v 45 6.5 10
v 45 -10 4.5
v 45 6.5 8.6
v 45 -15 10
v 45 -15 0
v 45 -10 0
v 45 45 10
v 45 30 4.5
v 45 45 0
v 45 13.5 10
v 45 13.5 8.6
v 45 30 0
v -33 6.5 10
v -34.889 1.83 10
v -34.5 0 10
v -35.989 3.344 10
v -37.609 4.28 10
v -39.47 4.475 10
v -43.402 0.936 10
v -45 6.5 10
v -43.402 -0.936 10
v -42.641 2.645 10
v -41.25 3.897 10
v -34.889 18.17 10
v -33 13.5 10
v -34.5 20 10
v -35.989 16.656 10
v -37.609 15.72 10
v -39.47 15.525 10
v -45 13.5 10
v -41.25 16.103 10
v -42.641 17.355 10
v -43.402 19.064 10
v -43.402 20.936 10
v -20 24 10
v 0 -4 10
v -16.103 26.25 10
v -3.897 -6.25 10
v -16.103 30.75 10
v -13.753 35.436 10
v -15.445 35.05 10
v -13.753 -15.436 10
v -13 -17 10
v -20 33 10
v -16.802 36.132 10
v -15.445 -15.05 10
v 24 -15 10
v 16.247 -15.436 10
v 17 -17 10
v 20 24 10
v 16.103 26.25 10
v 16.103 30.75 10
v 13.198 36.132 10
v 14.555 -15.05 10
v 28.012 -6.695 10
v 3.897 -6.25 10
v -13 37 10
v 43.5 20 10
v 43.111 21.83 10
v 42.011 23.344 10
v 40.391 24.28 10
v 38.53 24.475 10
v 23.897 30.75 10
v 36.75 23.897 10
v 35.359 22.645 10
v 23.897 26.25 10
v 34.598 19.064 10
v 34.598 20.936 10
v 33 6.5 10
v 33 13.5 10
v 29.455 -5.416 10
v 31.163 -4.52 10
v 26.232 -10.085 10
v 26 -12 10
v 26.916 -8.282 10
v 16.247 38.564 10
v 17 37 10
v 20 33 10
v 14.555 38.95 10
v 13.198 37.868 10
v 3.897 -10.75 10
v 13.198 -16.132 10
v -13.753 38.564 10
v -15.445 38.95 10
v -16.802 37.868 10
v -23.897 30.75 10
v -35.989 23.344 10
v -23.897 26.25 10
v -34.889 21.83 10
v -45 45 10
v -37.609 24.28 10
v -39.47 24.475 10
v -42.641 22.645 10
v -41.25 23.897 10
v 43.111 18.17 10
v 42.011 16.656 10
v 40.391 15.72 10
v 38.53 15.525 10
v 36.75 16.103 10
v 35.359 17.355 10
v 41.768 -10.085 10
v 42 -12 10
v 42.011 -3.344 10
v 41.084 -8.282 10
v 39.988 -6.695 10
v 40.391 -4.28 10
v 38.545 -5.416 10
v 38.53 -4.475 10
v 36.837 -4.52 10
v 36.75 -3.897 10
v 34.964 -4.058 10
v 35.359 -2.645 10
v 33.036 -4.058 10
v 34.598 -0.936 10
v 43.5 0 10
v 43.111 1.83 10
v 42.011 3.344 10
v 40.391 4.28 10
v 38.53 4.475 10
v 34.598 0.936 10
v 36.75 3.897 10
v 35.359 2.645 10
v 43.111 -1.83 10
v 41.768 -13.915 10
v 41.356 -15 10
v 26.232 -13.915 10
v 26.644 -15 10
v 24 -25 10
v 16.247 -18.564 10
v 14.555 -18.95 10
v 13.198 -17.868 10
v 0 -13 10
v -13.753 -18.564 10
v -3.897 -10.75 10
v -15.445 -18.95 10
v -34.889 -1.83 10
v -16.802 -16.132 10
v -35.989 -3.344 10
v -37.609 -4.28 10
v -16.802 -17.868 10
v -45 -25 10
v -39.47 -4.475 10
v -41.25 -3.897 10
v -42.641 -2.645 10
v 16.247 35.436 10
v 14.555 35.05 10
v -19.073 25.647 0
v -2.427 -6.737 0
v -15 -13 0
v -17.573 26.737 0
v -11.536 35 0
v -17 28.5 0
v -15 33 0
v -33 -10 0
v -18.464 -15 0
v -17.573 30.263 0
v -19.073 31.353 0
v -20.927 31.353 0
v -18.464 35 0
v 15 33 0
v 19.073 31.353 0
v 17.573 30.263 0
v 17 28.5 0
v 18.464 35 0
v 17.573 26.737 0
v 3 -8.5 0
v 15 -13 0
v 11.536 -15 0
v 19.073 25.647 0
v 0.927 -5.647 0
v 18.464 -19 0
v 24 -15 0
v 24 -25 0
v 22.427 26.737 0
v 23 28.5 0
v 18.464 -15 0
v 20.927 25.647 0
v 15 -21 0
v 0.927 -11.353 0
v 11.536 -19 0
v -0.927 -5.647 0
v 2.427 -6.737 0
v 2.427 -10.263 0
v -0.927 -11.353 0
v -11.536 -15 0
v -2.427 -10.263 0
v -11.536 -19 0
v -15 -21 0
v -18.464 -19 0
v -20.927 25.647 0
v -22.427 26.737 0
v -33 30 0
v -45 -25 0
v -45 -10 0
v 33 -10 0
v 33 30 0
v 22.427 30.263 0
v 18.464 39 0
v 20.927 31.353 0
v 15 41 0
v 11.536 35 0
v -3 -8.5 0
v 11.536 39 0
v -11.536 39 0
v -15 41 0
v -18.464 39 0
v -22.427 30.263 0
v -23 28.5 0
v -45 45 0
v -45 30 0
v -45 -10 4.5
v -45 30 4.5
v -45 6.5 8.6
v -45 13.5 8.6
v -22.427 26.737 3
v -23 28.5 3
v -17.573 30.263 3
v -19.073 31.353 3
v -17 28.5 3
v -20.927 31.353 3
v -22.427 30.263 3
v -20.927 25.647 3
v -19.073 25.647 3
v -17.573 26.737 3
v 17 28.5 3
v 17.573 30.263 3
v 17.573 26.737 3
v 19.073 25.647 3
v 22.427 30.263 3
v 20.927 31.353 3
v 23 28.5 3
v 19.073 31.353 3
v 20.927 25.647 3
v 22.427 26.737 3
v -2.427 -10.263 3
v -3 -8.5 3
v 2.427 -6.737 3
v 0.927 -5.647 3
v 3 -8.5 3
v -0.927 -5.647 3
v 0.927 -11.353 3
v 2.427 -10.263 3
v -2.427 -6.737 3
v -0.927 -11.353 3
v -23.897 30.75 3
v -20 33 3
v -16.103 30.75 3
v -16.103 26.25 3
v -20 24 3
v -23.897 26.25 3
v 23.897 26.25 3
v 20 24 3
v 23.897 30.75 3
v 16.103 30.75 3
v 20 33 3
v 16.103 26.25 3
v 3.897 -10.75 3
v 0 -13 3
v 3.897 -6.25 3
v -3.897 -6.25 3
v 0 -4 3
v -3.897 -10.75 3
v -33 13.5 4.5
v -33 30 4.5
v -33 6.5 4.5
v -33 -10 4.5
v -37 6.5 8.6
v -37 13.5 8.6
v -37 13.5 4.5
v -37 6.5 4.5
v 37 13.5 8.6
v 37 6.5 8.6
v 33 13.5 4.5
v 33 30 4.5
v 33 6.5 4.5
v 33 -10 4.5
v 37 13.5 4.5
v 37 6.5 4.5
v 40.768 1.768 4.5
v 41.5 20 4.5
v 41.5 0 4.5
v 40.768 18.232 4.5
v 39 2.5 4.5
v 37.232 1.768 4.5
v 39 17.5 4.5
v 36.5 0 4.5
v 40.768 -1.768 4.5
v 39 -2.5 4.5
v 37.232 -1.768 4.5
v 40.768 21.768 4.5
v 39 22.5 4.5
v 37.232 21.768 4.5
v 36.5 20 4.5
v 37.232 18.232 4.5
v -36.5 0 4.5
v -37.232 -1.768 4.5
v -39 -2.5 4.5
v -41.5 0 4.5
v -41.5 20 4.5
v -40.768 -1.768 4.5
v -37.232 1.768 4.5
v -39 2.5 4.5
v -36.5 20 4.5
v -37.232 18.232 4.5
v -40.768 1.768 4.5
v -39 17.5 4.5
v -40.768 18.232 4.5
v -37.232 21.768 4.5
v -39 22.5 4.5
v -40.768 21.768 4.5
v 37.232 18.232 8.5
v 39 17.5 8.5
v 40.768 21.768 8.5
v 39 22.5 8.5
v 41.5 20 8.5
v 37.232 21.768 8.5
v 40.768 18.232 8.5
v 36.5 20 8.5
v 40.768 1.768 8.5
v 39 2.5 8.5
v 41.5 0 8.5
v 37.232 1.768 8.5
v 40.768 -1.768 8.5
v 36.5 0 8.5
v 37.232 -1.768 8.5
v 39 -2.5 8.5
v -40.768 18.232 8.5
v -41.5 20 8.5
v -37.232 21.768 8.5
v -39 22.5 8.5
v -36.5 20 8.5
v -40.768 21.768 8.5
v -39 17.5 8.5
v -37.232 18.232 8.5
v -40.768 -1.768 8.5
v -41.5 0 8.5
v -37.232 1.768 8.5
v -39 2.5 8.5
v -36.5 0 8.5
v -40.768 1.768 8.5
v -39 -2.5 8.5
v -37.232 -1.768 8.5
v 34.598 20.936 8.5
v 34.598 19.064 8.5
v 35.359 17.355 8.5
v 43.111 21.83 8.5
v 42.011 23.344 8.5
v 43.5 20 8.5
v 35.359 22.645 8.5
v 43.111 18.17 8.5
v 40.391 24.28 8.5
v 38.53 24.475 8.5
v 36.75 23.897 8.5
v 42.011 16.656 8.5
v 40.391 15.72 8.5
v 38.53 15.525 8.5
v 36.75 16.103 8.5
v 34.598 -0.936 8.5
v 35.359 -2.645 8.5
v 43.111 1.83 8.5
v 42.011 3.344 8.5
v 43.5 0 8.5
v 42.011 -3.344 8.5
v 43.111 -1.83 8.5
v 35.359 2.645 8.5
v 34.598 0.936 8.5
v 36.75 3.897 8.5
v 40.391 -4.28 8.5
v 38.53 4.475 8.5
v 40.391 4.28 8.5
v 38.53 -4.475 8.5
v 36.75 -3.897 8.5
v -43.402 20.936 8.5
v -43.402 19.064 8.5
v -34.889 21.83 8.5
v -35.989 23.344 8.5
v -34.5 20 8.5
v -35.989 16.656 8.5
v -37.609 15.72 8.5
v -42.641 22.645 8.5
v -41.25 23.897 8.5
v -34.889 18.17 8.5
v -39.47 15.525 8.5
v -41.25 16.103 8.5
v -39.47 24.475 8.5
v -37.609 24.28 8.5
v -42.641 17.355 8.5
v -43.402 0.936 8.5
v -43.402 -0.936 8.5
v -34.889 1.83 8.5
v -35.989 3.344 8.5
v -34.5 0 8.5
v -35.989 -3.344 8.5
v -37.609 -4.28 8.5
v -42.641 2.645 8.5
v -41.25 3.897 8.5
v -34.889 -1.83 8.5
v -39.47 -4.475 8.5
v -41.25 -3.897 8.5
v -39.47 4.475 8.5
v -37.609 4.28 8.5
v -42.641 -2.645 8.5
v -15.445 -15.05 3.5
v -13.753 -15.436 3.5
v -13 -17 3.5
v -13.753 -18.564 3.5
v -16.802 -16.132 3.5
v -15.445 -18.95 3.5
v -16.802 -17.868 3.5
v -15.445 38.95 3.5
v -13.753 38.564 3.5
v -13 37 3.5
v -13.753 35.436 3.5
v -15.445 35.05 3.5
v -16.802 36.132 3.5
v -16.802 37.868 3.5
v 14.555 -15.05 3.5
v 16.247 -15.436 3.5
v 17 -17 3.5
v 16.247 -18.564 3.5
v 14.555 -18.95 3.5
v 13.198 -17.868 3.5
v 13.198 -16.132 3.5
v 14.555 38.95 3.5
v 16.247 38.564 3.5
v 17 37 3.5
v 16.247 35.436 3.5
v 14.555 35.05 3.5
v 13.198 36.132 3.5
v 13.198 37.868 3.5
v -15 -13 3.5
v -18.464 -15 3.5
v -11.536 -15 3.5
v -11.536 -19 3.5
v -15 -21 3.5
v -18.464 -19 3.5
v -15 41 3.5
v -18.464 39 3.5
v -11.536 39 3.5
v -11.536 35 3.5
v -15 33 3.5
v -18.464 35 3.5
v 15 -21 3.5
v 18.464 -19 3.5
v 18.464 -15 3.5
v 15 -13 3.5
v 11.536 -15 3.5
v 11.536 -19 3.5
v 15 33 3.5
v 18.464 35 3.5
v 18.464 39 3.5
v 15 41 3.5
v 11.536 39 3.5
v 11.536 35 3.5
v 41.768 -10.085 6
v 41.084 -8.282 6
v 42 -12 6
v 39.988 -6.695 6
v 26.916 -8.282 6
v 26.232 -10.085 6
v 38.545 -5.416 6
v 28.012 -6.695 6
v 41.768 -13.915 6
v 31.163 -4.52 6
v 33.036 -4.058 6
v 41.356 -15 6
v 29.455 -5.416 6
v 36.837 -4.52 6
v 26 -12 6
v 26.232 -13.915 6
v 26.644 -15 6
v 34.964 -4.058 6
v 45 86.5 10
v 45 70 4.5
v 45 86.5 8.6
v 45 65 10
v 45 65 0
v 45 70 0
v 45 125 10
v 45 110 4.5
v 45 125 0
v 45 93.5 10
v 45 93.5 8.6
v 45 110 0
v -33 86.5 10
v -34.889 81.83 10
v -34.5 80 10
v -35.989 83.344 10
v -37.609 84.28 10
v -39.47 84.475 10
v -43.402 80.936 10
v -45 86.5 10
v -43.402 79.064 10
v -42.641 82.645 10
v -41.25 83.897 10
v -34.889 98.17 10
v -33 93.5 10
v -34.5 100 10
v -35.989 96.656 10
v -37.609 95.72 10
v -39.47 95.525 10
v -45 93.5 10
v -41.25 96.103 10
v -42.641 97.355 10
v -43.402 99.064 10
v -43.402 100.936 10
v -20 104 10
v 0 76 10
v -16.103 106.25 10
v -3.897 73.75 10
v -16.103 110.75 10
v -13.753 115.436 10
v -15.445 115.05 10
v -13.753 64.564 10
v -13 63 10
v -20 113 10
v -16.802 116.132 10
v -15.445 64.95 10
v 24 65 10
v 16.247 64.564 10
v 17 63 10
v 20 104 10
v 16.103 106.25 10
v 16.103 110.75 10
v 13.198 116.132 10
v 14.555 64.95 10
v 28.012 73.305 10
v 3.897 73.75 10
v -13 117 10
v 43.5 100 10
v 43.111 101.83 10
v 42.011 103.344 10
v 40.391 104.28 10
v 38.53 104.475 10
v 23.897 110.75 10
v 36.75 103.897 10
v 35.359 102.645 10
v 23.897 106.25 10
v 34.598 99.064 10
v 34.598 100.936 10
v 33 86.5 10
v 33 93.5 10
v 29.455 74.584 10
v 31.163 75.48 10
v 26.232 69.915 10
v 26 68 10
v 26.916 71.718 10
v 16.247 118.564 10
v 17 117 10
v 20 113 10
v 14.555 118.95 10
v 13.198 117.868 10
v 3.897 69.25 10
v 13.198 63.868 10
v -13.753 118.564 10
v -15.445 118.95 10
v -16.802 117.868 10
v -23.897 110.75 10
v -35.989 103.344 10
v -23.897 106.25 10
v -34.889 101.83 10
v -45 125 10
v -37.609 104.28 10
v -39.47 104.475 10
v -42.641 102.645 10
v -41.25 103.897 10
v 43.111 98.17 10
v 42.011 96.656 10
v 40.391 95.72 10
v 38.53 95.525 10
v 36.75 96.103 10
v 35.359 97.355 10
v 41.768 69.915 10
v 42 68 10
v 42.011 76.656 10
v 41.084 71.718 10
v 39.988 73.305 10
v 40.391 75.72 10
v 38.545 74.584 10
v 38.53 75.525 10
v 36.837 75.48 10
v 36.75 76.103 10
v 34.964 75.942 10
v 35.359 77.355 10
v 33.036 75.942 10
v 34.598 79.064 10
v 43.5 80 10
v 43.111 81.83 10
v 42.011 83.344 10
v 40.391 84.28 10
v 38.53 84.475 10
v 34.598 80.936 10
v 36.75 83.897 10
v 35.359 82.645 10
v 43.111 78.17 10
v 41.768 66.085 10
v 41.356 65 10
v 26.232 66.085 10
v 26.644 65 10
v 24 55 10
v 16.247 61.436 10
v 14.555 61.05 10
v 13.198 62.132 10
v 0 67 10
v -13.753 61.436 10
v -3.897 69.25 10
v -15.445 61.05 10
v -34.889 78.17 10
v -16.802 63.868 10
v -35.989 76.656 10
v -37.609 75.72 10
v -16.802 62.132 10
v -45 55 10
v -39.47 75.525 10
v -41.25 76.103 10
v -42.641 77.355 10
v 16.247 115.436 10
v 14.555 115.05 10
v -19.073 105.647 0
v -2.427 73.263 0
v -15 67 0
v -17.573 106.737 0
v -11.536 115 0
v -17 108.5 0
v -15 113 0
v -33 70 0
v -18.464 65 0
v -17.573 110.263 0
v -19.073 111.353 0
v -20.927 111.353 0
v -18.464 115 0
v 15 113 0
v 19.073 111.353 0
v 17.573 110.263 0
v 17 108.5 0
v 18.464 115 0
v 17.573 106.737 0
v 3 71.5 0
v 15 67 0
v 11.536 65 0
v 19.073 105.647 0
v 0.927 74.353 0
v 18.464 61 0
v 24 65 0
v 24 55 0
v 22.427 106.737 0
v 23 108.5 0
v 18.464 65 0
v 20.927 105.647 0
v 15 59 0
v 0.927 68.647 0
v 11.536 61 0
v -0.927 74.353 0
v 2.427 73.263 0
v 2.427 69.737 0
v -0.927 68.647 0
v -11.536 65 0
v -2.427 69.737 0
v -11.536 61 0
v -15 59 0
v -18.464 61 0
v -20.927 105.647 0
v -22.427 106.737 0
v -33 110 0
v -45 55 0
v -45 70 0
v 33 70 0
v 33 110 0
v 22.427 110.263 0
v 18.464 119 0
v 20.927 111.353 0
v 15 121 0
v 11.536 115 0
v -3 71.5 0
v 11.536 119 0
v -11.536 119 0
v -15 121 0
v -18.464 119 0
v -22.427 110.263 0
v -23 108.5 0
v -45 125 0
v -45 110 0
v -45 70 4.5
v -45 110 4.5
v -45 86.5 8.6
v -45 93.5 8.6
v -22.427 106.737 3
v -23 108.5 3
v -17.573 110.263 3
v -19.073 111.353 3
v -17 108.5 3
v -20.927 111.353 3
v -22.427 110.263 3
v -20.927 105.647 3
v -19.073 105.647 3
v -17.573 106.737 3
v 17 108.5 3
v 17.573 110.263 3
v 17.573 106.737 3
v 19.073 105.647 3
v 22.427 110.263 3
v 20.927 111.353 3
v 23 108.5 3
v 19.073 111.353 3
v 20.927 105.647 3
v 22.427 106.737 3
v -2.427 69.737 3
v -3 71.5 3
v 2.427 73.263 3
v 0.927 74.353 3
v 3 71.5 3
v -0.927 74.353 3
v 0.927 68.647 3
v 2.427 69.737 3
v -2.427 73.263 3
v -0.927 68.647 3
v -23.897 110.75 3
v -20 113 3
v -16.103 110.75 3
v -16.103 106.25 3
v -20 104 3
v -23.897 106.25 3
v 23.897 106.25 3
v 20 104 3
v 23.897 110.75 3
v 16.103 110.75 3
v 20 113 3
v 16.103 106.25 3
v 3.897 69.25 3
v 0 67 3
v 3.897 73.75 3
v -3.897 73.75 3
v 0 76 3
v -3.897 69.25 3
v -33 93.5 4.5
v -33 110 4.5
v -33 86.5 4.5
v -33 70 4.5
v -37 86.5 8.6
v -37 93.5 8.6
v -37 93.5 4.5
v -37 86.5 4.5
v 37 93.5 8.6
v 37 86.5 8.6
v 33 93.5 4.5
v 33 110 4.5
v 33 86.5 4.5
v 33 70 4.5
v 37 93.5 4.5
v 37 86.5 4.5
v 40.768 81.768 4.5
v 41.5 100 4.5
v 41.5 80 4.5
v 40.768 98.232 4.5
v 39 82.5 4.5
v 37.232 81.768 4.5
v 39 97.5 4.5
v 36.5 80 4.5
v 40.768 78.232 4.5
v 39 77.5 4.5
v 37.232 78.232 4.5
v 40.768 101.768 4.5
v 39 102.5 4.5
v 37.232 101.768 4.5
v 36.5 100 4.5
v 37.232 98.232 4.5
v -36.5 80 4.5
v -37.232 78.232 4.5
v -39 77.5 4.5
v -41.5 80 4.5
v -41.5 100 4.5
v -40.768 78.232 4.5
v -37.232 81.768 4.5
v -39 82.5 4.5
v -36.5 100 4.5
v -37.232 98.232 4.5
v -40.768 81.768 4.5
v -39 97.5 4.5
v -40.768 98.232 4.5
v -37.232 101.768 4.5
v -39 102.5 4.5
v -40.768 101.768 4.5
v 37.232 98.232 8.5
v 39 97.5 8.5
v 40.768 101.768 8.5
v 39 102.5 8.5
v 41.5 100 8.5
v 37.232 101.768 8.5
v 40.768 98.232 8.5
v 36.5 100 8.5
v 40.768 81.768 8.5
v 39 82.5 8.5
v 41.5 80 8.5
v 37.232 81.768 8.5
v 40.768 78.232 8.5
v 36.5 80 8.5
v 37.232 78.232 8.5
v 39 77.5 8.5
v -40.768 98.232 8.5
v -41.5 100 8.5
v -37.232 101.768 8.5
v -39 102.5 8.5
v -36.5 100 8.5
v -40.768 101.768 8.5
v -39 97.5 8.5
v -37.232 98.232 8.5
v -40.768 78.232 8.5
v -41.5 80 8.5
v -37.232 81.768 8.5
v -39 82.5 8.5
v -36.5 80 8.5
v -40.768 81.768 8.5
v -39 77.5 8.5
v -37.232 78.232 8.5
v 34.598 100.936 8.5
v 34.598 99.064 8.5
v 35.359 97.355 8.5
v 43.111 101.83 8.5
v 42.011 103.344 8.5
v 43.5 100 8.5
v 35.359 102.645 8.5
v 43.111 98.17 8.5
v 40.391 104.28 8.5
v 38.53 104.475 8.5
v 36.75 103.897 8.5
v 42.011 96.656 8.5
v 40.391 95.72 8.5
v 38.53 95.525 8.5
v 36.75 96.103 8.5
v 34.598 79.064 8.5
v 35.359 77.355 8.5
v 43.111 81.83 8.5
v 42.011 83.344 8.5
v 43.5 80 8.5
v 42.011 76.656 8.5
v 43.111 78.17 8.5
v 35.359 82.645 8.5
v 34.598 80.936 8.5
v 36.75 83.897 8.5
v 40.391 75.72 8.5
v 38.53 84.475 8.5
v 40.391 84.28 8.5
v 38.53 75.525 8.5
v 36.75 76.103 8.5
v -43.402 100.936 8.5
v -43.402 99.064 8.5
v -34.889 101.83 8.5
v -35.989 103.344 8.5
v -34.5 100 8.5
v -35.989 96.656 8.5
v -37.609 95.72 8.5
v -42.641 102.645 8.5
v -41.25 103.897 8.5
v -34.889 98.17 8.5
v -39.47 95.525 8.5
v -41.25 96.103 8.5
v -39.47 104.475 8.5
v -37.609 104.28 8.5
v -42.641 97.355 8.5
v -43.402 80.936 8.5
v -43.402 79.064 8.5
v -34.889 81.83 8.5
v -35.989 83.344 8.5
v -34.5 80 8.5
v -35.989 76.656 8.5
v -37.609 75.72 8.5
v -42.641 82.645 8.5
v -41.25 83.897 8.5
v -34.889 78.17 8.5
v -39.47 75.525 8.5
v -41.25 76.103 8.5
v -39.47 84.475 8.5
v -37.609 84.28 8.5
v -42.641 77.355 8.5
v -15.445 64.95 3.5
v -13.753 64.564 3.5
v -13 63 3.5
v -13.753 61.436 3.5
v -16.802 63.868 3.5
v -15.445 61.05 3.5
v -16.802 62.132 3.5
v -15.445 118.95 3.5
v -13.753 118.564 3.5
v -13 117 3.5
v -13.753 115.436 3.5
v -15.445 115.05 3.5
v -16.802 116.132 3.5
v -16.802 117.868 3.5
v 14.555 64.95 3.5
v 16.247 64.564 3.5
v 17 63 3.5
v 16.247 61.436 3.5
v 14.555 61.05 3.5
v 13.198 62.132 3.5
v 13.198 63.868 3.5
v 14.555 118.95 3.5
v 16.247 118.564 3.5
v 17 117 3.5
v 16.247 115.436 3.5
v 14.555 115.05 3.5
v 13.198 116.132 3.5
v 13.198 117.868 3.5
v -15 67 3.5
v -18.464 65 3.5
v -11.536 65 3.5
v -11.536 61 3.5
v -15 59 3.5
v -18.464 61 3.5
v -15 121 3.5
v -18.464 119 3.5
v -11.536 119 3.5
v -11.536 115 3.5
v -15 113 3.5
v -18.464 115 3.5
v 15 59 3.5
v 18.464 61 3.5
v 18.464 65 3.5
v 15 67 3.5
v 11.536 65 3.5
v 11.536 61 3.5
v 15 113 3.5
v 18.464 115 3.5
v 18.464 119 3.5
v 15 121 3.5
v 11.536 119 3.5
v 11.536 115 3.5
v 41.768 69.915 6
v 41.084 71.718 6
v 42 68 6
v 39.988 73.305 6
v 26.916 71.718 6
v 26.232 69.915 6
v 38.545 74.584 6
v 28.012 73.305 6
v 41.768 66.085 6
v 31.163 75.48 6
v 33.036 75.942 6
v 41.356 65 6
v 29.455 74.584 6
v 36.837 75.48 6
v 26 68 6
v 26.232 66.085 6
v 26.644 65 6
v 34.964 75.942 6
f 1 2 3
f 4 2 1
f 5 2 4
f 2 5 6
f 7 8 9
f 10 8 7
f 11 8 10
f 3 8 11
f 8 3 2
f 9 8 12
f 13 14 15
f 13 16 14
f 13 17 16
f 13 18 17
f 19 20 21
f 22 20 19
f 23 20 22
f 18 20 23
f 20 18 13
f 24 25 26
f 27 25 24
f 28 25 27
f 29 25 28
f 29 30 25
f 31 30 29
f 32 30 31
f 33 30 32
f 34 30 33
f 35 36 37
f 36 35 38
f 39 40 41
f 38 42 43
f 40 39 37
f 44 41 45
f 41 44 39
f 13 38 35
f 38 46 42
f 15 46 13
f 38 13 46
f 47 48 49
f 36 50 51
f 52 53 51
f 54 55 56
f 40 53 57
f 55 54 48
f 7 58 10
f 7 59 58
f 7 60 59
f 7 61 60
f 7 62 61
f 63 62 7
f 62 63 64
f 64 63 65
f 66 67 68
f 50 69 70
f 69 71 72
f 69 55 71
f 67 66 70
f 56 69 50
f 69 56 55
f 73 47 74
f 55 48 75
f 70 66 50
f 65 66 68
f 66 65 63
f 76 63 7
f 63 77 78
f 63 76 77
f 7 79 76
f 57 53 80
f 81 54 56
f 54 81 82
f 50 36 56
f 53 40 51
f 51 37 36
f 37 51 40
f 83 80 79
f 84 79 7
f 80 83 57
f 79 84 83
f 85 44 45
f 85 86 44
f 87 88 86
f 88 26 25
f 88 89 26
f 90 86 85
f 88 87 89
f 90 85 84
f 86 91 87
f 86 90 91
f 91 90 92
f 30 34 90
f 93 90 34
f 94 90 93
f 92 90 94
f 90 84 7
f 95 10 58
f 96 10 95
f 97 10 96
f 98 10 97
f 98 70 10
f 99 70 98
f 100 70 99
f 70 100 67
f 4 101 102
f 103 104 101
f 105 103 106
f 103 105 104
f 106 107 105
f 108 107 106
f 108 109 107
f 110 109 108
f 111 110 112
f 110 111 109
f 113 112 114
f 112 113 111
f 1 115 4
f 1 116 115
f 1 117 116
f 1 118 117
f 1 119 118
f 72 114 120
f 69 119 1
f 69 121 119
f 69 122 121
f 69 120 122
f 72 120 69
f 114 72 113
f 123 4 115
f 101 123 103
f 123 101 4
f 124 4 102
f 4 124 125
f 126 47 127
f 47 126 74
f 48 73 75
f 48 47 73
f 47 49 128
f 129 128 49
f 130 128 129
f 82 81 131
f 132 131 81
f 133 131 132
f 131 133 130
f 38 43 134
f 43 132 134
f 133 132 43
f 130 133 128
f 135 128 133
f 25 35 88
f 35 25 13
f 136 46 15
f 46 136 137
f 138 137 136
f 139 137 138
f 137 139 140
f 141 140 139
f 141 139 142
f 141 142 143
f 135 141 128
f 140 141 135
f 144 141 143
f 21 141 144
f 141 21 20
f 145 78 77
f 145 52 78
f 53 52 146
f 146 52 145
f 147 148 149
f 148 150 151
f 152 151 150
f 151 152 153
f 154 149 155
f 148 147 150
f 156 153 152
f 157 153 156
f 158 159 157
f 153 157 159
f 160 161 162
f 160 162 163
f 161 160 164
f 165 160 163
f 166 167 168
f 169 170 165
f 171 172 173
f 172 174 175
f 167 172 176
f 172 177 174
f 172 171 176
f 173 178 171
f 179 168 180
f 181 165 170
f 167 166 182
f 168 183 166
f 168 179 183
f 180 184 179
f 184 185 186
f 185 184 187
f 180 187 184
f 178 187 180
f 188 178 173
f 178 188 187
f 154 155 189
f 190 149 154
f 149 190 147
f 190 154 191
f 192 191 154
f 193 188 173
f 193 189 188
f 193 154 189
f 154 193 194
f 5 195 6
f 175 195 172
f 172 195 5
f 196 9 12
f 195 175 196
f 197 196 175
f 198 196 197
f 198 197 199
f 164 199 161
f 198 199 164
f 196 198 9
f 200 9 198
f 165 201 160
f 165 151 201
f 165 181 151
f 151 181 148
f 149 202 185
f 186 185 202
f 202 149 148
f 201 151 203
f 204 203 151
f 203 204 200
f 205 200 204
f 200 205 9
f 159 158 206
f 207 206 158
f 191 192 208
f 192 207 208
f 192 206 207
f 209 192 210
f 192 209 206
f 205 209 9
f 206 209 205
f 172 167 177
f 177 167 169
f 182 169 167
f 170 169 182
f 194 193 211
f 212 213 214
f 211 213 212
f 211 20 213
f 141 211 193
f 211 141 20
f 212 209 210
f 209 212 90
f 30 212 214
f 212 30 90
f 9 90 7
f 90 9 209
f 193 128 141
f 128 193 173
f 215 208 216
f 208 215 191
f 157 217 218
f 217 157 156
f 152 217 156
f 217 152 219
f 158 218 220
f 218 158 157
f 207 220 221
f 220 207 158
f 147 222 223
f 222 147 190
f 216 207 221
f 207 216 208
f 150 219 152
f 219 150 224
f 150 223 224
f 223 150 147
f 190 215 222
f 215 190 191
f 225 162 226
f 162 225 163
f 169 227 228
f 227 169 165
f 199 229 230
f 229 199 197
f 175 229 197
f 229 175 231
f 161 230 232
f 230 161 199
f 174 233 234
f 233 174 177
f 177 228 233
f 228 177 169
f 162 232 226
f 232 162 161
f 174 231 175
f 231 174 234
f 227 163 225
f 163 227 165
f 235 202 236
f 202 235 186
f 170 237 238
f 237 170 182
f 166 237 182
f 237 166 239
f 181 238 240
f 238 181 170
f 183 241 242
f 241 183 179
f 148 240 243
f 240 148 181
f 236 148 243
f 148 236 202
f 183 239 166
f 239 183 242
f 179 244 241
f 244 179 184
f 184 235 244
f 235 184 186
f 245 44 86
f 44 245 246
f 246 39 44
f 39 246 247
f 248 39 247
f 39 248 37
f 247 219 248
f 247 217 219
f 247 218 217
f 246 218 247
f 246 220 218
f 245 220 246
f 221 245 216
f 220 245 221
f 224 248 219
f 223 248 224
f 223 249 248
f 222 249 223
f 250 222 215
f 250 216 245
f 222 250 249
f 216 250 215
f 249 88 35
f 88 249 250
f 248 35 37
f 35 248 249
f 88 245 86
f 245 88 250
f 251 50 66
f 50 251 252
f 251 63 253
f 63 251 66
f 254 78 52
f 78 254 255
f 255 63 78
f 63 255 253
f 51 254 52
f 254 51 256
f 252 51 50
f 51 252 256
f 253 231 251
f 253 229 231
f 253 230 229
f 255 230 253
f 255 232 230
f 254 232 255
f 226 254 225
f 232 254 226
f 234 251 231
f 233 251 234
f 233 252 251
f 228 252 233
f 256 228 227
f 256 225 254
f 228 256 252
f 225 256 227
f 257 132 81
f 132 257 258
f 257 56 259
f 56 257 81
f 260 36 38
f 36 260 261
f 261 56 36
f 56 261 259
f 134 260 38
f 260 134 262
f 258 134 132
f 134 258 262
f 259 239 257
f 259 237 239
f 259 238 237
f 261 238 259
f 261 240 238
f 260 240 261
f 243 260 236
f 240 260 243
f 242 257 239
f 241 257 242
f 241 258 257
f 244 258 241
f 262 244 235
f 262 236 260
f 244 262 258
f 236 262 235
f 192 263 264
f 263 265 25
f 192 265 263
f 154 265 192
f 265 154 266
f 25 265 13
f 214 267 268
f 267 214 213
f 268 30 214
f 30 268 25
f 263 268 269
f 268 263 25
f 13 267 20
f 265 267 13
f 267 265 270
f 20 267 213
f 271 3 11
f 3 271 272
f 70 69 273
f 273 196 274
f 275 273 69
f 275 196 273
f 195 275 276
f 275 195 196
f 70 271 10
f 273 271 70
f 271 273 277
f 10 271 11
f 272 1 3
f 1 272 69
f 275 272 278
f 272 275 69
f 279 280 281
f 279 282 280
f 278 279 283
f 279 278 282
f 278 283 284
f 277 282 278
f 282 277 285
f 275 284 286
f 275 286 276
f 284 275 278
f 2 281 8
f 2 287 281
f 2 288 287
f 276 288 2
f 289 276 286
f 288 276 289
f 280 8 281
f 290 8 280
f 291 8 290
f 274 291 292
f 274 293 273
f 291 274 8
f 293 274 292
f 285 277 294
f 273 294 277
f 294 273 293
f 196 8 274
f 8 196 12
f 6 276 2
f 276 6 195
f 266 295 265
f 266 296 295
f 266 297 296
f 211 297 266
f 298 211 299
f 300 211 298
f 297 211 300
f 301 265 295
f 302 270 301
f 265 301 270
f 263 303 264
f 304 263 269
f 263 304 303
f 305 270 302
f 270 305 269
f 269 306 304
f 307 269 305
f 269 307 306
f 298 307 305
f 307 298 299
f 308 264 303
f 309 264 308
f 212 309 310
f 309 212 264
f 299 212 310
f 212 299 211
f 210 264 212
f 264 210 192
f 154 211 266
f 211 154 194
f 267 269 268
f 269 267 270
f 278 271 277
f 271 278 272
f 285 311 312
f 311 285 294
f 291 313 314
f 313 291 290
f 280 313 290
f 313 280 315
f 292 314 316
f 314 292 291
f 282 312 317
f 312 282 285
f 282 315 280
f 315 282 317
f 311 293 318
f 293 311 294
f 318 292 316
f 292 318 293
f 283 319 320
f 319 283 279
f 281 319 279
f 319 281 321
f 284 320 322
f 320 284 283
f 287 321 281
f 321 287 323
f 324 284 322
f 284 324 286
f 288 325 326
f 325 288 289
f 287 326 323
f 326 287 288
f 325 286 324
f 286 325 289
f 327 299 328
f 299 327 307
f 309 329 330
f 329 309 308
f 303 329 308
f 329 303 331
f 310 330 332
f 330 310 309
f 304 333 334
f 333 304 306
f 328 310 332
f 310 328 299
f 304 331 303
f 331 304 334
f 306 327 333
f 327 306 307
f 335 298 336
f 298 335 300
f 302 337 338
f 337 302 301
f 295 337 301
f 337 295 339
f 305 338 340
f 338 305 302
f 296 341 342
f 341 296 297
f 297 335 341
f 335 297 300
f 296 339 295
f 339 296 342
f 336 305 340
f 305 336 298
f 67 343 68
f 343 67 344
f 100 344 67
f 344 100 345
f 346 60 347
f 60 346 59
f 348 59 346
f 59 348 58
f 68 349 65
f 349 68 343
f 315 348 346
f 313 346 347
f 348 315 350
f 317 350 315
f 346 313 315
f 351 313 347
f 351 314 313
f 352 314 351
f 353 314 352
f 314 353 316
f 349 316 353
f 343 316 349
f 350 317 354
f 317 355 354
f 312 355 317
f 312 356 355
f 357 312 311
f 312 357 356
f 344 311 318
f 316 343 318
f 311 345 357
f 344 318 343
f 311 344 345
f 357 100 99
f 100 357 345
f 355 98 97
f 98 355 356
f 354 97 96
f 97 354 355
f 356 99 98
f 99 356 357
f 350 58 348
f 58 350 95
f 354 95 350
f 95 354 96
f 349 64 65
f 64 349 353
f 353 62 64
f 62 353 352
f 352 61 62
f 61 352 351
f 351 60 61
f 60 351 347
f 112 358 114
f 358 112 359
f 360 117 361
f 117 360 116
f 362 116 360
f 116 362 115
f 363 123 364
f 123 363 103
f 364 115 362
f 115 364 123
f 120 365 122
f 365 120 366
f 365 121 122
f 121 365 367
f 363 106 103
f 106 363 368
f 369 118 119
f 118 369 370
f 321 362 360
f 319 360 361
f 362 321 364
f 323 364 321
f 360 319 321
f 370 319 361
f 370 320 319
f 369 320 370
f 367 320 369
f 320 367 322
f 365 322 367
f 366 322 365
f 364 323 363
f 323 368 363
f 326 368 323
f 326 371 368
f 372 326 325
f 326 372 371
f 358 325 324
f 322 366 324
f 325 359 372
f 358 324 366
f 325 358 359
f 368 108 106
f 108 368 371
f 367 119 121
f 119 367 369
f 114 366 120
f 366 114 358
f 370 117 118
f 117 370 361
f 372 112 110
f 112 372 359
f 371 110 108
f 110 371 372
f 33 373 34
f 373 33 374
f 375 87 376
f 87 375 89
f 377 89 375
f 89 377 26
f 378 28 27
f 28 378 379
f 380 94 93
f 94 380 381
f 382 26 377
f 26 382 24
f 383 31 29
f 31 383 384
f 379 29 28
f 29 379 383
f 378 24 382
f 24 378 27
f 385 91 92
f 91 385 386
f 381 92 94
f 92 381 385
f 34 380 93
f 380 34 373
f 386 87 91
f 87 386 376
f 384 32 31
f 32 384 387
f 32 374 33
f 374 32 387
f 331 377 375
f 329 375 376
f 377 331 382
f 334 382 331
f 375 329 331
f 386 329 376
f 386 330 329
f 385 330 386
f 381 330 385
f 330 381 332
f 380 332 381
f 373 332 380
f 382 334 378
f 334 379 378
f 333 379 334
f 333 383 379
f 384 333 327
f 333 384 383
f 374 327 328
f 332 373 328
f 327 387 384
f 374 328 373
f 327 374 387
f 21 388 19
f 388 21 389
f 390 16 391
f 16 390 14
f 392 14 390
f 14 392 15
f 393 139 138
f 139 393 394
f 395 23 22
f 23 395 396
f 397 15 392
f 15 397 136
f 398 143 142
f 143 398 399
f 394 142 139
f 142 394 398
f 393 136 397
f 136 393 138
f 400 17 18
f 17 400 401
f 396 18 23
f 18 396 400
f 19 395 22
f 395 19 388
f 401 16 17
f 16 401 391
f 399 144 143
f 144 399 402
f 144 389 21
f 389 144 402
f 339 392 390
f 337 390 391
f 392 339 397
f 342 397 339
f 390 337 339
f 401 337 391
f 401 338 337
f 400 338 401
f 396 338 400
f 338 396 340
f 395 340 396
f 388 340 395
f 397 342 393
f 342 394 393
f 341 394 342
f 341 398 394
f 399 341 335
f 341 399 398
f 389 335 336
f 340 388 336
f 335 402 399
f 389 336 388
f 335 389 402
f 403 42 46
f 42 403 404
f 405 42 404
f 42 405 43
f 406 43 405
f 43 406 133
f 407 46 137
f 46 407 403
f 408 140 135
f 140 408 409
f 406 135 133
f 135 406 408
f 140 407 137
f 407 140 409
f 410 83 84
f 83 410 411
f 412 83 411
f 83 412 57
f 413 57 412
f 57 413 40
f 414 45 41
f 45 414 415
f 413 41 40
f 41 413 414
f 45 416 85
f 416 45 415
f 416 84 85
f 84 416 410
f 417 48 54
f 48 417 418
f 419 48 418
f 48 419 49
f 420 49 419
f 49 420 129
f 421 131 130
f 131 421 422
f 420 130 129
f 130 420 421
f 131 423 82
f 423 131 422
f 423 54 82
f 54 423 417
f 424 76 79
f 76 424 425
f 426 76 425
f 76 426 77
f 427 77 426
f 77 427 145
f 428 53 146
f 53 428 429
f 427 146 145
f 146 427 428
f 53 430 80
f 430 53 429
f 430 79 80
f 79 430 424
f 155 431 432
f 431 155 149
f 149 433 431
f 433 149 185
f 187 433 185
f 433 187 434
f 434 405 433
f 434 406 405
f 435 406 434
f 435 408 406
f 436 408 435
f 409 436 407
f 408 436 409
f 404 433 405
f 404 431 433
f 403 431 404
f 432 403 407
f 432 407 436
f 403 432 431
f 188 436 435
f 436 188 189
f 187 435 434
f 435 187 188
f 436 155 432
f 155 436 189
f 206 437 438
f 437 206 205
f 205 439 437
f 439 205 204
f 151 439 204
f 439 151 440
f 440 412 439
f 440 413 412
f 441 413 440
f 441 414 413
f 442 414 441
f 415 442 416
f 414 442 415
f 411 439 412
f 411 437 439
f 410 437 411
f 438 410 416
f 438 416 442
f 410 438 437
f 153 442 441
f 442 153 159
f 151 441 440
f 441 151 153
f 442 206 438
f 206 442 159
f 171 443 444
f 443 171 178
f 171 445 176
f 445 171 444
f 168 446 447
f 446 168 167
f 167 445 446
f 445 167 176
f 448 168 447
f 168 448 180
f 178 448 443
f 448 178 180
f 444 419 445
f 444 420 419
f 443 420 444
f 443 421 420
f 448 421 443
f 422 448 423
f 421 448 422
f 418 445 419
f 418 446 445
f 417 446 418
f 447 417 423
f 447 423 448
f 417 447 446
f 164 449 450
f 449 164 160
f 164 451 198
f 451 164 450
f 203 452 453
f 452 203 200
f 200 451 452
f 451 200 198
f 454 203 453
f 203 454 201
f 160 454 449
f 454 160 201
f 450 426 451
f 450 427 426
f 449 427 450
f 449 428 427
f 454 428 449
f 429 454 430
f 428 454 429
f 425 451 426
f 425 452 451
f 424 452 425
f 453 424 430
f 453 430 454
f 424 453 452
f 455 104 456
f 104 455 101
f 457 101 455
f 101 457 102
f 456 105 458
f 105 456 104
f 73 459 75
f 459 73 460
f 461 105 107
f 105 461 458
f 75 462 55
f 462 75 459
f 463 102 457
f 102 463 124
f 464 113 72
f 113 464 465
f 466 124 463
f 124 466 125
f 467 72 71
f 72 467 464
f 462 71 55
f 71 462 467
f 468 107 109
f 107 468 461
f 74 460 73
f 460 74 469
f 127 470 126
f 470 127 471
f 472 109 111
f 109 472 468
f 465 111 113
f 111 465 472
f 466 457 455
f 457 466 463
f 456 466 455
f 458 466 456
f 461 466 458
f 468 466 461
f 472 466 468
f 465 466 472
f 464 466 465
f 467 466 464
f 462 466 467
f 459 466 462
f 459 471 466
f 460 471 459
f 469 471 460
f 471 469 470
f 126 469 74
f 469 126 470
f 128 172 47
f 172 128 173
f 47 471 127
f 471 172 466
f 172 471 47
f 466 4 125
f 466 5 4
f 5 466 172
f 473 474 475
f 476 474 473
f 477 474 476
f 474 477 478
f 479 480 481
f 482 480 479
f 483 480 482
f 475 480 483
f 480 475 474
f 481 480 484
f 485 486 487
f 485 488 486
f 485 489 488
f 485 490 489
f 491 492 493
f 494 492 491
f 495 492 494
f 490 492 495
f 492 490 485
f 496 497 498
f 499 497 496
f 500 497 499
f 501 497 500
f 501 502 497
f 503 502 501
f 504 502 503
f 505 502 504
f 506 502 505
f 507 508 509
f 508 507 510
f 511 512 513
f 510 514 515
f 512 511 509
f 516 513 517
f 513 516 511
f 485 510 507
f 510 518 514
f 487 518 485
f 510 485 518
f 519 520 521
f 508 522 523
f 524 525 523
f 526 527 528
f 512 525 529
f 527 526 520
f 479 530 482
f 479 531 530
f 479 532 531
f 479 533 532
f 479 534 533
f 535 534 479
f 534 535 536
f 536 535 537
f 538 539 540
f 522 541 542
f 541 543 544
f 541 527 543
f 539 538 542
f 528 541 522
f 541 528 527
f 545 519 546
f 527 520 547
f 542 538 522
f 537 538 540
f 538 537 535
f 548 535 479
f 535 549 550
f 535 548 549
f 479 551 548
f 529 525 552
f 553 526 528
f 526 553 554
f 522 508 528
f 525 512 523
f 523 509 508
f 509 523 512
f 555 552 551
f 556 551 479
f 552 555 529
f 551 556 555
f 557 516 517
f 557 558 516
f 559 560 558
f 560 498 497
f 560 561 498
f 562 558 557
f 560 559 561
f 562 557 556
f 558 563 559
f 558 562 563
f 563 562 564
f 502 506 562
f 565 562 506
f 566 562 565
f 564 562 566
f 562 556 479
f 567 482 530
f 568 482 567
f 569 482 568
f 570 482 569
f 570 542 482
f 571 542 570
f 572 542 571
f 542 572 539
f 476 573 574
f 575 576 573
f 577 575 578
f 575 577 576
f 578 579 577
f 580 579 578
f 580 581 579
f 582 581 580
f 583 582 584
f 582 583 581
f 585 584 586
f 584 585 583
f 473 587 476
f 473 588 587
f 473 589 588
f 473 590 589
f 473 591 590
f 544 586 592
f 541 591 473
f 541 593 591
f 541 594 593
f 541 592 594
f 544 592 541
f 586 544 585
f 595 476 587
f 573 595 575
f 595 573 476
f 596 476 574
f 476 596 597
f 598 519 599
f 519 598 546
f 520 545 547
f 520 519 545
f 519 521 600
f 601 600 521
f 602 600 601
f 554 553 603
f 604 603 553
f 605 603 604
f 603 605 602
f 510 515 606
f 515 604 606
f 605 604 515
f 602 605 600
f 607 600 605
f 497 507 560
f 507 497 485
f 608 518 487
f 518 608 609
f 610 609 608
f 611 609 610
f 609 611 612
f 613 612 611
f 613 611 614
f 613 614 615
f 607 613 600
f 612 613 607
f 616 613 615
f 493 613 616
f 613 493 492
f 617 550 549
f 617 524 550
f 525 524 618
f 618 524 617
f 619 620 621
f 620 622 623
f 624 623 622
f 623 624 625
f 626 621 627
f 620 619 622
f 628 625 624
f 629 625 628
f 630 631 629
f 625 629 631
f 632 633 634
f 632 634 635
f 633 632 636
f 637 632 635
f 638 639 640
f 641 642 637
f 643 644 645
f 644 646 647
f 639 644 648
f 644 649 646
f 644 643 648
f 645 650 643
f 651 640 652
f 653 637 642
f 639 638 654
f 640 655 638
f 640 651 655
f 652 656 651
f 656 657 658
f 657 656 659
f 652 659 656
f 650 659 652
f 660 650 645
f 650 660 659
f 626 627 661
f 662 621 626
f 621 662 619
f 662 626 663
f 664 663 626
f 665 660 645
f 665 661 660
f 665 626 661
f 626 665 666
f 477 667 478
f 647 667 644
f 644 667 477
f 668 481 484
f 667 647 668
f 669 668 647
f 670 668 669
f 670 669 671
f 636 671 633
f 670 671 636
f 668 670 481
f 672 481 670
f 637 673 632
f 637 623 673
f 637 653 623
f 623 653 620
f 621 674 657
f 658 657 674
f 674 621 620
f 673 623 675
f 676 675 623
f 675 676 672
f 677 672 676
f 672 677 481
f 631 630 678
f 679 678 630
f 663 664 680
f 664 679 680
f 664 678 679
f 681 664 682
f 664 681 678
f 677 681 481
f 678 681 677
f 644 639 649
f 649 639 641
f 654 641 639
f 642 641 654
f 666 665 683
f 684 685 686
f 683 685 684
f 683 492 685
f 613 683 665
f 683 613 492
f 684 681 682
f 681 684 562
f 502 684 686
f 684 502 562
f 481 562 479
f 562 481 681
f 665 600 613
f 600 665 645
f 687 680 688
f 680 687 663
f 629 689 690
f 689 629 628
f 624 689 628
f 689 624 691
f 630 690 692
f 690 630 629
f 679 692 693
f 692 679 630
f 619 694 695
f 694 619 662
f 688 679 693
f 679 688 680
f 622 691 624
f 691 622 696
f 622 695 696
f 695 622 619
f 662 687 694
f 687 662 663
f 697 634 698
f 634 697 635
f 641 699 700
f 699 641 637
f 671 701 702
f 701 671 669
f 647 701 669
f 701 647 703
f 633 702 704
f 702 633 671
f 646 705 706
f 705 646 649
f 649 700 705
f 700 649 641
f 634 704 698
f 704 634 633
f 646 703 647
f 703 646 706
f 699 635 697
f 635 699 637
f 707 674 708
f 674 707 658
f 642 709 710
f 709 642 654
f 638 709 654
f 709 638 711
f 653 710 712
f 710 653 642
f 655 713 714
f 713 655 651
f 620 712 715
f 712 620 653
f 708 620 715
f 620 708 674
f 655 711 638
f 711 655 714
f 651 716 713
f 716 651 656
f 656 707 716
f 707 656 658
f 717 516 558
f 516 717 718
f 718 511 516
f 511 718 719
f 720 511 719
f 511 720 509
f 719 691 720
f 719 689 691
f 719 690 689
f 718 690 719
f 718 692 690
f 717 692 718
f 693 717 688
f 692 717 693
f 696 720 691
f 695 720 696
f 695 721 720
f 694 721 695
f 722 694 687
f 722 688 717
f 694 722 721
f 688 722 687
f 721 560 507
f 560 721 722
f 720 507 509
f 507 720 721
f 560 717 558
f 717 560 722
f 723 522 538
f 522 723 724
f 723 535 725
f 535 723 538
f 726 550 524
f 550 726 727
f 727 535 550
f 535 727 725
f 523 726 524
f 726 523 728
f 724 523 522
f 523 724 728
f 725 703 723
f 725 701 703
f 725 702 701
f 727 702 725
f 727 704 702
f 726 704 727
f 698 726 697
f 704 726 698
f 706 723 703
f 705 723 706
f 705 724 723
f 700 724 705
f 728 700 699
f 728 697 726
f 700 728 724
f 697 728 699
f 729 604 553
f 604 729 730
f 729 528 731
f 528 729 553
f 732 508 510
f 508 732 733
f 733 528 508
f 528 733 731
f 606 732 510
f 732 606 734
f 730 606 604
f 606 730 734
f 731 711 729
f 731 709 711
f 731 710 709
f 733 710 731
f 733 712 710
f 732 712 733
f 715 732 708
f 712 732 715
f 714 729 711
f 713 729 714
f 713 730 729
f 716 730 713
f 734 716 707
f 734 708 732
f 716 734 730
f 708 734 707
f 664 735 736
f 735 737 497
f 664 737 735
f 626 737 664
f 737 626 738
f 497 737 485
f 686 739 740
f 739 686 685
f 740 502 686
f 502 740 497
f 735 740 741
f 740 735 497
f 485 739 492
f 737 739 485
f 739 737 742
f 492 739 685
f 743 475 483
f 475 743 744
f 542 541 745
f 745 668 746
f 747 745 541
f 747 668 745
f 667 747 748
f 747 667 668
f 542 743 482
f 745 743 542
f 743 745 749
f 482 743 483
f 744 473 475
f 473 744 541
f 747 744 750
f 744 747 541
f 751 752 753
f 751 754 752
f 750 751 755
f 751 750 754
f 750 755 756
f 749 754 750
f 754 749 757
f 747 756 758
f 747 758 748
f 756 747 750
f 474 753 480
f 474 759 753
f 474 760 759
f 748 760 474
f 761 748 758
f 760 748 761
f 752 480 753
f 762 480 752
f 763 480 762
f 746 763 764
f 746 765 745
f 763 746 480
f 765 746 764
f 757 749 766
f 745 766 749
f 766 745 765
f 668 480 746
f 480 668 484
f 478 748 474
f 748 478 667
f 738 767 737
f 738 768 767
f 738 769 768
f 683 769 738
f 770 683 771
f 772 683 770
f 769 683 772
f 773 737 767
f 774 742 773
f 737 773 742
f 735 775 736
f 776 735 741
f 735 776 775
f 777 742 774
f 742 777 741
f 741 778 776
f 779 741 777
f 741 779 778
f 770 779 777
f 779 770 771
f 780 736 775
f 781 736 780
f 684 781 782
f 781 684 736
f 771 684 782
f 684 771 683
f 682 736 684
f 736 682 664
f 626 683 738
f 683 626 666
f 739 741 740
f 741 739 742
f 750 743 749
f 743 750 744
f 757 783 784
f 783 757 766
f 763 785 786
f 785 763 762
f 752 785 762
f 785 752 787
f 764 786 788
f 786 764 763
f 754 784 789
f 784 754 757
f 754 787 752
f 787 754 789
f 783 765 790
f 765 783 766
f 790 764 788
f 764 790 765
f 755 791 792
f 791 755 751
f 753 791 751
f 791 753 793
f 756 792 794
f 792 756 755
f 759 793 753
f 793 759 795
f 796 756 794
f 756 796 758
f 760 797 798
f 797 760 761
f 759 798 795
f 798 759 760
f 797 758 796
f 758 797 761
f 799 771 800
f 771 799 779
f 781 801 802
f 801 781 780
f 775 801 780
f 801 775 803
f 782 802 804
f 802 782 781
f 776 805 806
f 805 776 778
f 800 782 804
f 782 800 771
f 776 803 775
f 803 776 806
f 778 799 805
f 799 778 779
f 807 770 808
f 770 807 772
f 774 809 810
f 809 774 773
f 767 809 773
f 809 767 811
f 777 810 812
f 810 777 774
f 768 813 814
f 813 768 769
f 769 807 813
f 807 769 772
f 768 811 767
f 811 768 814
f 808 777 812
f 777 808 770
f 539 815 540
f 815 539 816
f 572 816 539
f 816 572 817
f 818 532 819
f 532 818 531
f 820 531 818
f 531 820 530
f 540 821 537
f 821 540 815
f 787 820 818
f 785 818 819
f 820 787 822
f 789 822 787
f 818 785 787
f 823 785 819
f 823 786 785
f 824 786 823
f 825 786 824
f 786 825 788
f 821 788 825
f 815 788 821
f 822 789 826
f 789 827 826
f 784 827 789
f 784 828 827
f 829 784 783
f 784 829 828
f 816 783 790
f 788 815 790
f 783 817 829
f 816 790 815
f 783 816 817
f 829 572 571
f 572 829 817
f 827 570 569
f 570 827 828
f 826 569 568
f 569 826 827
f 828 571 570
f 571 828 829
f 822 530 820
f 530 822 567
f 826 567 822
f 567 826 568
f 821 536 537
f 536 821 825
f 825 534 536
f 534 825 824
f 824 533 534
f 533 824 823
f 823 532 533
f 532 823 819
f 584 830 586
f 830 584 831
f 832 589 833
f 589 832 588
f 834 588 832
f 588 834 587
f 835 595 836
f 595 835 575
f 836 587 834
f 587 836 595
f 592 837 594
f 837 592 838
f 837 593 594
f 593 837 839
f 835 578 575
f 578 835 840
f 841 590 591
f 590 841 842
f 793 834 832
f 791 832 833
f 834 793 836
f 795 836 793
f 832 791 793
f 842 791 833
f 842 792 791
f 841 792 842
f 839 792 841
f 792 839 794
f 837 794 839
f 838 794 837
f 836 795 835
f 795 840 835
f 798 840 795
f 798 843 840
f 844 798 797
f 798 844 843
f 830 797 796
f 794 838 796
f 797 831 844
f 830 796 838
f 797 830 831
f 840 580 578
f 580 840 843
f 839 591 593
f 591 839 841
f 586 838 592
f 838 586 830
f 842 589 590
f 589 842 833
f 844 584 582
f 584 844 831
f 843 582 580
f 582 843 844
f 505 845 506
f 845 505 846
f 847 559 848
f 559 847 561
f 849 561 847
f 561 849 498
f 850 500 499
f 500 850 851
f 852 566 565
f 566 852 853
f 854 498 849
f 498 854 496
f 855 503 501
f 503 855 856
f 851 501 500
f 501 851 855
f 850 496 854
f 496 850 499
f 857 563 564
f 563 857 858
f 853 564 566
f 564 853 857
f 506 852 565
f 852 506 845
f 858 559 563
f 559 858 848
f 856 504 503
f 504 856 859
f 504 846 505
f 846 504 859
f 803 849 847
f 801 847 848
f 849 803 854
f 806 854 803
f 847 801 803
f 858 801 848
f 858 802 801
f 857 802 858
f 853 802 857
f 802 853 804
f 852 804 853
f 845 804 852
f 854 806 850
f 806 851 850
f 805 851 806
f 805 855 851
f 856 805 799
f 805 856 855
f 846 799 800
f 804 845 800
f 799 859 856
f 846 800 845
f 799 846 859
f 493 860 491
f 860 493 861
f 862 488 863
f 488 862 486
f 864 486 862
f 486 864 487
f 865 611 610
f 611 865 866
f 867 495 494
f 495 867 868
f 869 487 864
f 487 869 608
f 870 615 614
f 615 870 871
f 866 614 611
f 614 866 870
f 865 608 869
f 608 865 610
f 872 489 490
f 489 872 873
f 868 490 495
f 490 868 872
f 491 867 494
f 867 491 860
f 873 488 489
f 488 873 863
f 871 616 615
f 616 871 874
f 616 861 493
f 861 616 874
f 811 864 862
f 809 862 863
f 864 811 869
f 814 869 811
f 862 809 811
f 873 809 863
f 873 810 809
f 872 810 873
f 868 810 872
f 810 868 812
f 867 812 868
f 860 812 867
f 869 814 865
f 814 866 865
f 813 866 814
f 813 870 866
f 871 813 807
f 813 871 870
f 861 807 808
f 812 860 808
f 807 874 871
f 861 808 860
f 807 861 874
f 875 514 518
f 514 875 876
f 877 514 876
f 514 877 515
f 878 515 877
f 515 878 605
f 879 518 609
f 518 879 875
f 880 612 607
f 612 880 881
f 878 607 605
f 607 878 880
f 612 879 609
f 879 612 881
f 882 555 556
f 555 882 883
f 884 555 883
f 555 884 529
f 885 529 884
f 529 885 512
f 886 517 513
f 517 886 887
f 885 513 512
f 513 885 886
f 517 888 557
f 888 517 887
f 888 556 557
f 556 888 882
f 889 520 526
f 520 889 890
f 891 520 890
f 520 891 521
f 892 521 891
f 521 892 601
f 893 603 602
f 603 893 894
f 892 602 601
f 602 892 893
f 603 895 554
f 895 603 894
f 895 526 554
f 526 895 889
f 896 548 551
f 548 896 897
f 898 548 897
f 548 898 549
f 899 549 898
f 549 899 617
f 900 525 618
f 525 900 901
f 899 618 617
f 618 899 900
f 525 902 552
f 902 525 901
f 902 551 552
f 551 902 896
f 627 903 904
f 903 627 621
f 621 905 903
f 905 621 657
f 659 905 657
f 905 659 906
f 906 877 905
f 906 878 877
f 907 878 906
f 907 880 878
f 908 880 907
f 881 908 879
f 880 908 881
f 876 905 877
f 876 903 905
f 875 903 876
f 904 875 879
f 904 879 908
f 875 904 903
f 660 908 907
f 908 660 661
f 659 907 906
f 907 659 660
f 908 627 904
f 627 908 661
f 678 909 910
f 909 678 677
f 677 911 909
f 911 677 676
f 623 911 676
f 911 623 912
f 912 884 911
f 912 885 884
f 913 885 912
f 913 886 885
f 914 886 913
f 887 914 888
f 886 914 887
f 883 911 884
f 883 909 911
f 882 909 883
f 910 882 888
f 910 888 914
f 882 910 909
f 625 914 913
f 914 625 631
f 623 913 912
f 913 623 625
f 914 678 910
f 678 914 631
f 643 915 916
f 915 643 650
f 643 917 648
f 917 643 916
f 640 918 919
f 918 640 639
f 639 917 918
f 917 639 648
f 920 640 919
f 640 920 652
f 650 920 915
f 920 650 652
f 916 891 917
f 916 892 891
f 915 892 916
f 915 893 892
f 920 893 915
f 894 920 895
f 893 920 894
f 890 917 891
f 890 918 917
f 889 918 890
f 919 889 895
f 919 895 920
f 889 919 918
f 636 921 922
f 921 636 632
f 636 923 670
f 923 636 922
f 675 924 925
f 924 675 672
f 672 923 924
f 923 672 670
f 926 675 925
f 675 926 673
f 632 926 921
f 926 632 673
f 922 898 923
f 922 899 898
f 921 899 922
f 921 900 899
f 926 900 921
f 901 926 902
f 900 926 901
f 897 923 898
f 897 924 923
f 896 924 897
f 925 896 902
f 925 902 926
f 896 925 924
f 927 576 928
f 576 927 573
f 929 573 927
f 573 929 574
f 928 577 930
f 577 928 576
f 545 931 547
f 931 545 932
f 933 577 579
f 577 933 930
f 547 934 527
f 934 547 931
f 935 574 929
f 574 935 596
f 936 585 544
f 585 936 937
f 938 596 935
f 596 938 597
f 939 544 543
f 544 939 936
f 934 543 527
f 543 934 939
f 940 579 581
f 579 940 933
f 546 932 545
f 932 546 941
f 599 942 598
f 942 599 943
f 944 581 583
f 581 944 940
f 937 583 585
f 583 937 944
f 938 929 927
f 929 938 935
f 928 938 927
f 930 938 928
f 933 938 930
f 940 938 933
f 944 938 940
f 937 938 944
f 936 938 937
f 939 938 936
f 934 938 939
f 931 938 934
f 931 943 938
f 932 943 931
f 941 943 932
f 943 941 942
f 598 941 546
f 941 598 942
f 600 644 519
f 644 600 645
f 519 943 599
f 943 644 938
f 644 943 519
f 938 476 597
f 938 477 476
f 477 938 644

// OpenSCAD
// file: x-carriage-plate.scad
module x_carriage_plate(belt_offset, wheel_x_offset, wheel_z_offset) {
    echo("x_carriage_plate", belt_offset, wheel_x_offset, wheel_z_offset);
    difference() {
        union() {
            translate([-45,-25, 11.5]) cube([90, 70, 10]);
	};
        translate([-20, wheel_x_offset+10, -6.5]) #cylinder(d=6, h=23.5);
        translate([20, wheel_x_offset+10, -6.5]) #cylinder(d=6, h=23.5);
        translate([0, -wheel_x_offset+10, -6.5]) #cylinder(d=6, h=23.5);
	translate([-20, wheel_x_offset+10, 11.5+3]) rotate([0,0,30]) #cylinder(d=9, h=14, $fn=6);
        translate([20, wheel_x_offset+10, 11.5+3]) rotate([0,0,30]) #cylinder(d=9, h=14, $fn=6);
        translate([0, -wheel_x_offset+10, 11.5+3]) rotate([0,0,30]) #cylinder(d=9, h=14, $fn=6);

	translate([-73,-3.5 + 10,belt_offset+12.2/2]) #cube([40,7,5]);
	translate([33,-3.5 + 10,belt_offset+12.2/2]) #cube([40,7,5]);
	translate([33,-20 + 10, 10]) #cube([40,40,6]);
	translate([-73,-20 + 10, 10]) #cube([40,40,6]);

	translate([-37,-3.5 + 10, 0]) #cube([4,7,35]);
	translate([33,-3.5 + 10, 0]) #cube([4,7,35]);

        translate([39, 20, 12]) cylinder(d=5, h=10);
        translate([39, 0, 12]) cylinder(d=5, h=10);
        translate([-39, 20, 12]) cylinder(d=5, h=10);
        translate([-39, 0, 12]) cylinder(d=5, h=10);

        translate([39, 20, 20]) cylinder(d=9, h=10);
        translate([39, 0, 20]) cylinder(d=9, h=10);
        translate([-39, 20, 20]) cylinder(d=9, h=10);
        translate([-39, 0, 20]) cylinder(d=9, h=10);

	a = 15;
	b = 27;
        translate([-a, 10-b, 10]) #cylinder(d=4, h=100);
        translate([-a, b+10, 10]) #cylinder(d=4, h=100);
        translate([a, 10-b, 10]) #cylinder(d=4, h=100);
        translate([a, b+10, 10]) #cylinder(d=4, h=100);

        translate([-a, 10-b, 10]) rotate([0,0,30]) #cylinder(d=8, h=5, $fn=6);
        translate([-a, b+10, 10]) rotate([0,0,30]) #cylinder(d=8, h=5, $fn=6);
        translate([a, 10-b, 10]) rotate([0,0,30]) #cylinder(d=8, h=5, $fn=6);
        translate([a, b+10, 10]) rotate([0,0,30]) #cylinder(d=8, h=5, $fn=6);

        translate([34, -12, 11.5+10-4]) #cylinder(d=16, h=50);
        translate([24, -35, 10]) #cube([40,20,40]);

    };
}
// main file
include <x-carriage-plate.scad>

translate([0,0,-11.5]) rotate([0,0,0]) x_carriage_plate(14, 18.5, 2.5);
translate([0,80,-11.5]) rotate([0,0,0]) x_carriage_plate(14, 18.5, 2.5);
